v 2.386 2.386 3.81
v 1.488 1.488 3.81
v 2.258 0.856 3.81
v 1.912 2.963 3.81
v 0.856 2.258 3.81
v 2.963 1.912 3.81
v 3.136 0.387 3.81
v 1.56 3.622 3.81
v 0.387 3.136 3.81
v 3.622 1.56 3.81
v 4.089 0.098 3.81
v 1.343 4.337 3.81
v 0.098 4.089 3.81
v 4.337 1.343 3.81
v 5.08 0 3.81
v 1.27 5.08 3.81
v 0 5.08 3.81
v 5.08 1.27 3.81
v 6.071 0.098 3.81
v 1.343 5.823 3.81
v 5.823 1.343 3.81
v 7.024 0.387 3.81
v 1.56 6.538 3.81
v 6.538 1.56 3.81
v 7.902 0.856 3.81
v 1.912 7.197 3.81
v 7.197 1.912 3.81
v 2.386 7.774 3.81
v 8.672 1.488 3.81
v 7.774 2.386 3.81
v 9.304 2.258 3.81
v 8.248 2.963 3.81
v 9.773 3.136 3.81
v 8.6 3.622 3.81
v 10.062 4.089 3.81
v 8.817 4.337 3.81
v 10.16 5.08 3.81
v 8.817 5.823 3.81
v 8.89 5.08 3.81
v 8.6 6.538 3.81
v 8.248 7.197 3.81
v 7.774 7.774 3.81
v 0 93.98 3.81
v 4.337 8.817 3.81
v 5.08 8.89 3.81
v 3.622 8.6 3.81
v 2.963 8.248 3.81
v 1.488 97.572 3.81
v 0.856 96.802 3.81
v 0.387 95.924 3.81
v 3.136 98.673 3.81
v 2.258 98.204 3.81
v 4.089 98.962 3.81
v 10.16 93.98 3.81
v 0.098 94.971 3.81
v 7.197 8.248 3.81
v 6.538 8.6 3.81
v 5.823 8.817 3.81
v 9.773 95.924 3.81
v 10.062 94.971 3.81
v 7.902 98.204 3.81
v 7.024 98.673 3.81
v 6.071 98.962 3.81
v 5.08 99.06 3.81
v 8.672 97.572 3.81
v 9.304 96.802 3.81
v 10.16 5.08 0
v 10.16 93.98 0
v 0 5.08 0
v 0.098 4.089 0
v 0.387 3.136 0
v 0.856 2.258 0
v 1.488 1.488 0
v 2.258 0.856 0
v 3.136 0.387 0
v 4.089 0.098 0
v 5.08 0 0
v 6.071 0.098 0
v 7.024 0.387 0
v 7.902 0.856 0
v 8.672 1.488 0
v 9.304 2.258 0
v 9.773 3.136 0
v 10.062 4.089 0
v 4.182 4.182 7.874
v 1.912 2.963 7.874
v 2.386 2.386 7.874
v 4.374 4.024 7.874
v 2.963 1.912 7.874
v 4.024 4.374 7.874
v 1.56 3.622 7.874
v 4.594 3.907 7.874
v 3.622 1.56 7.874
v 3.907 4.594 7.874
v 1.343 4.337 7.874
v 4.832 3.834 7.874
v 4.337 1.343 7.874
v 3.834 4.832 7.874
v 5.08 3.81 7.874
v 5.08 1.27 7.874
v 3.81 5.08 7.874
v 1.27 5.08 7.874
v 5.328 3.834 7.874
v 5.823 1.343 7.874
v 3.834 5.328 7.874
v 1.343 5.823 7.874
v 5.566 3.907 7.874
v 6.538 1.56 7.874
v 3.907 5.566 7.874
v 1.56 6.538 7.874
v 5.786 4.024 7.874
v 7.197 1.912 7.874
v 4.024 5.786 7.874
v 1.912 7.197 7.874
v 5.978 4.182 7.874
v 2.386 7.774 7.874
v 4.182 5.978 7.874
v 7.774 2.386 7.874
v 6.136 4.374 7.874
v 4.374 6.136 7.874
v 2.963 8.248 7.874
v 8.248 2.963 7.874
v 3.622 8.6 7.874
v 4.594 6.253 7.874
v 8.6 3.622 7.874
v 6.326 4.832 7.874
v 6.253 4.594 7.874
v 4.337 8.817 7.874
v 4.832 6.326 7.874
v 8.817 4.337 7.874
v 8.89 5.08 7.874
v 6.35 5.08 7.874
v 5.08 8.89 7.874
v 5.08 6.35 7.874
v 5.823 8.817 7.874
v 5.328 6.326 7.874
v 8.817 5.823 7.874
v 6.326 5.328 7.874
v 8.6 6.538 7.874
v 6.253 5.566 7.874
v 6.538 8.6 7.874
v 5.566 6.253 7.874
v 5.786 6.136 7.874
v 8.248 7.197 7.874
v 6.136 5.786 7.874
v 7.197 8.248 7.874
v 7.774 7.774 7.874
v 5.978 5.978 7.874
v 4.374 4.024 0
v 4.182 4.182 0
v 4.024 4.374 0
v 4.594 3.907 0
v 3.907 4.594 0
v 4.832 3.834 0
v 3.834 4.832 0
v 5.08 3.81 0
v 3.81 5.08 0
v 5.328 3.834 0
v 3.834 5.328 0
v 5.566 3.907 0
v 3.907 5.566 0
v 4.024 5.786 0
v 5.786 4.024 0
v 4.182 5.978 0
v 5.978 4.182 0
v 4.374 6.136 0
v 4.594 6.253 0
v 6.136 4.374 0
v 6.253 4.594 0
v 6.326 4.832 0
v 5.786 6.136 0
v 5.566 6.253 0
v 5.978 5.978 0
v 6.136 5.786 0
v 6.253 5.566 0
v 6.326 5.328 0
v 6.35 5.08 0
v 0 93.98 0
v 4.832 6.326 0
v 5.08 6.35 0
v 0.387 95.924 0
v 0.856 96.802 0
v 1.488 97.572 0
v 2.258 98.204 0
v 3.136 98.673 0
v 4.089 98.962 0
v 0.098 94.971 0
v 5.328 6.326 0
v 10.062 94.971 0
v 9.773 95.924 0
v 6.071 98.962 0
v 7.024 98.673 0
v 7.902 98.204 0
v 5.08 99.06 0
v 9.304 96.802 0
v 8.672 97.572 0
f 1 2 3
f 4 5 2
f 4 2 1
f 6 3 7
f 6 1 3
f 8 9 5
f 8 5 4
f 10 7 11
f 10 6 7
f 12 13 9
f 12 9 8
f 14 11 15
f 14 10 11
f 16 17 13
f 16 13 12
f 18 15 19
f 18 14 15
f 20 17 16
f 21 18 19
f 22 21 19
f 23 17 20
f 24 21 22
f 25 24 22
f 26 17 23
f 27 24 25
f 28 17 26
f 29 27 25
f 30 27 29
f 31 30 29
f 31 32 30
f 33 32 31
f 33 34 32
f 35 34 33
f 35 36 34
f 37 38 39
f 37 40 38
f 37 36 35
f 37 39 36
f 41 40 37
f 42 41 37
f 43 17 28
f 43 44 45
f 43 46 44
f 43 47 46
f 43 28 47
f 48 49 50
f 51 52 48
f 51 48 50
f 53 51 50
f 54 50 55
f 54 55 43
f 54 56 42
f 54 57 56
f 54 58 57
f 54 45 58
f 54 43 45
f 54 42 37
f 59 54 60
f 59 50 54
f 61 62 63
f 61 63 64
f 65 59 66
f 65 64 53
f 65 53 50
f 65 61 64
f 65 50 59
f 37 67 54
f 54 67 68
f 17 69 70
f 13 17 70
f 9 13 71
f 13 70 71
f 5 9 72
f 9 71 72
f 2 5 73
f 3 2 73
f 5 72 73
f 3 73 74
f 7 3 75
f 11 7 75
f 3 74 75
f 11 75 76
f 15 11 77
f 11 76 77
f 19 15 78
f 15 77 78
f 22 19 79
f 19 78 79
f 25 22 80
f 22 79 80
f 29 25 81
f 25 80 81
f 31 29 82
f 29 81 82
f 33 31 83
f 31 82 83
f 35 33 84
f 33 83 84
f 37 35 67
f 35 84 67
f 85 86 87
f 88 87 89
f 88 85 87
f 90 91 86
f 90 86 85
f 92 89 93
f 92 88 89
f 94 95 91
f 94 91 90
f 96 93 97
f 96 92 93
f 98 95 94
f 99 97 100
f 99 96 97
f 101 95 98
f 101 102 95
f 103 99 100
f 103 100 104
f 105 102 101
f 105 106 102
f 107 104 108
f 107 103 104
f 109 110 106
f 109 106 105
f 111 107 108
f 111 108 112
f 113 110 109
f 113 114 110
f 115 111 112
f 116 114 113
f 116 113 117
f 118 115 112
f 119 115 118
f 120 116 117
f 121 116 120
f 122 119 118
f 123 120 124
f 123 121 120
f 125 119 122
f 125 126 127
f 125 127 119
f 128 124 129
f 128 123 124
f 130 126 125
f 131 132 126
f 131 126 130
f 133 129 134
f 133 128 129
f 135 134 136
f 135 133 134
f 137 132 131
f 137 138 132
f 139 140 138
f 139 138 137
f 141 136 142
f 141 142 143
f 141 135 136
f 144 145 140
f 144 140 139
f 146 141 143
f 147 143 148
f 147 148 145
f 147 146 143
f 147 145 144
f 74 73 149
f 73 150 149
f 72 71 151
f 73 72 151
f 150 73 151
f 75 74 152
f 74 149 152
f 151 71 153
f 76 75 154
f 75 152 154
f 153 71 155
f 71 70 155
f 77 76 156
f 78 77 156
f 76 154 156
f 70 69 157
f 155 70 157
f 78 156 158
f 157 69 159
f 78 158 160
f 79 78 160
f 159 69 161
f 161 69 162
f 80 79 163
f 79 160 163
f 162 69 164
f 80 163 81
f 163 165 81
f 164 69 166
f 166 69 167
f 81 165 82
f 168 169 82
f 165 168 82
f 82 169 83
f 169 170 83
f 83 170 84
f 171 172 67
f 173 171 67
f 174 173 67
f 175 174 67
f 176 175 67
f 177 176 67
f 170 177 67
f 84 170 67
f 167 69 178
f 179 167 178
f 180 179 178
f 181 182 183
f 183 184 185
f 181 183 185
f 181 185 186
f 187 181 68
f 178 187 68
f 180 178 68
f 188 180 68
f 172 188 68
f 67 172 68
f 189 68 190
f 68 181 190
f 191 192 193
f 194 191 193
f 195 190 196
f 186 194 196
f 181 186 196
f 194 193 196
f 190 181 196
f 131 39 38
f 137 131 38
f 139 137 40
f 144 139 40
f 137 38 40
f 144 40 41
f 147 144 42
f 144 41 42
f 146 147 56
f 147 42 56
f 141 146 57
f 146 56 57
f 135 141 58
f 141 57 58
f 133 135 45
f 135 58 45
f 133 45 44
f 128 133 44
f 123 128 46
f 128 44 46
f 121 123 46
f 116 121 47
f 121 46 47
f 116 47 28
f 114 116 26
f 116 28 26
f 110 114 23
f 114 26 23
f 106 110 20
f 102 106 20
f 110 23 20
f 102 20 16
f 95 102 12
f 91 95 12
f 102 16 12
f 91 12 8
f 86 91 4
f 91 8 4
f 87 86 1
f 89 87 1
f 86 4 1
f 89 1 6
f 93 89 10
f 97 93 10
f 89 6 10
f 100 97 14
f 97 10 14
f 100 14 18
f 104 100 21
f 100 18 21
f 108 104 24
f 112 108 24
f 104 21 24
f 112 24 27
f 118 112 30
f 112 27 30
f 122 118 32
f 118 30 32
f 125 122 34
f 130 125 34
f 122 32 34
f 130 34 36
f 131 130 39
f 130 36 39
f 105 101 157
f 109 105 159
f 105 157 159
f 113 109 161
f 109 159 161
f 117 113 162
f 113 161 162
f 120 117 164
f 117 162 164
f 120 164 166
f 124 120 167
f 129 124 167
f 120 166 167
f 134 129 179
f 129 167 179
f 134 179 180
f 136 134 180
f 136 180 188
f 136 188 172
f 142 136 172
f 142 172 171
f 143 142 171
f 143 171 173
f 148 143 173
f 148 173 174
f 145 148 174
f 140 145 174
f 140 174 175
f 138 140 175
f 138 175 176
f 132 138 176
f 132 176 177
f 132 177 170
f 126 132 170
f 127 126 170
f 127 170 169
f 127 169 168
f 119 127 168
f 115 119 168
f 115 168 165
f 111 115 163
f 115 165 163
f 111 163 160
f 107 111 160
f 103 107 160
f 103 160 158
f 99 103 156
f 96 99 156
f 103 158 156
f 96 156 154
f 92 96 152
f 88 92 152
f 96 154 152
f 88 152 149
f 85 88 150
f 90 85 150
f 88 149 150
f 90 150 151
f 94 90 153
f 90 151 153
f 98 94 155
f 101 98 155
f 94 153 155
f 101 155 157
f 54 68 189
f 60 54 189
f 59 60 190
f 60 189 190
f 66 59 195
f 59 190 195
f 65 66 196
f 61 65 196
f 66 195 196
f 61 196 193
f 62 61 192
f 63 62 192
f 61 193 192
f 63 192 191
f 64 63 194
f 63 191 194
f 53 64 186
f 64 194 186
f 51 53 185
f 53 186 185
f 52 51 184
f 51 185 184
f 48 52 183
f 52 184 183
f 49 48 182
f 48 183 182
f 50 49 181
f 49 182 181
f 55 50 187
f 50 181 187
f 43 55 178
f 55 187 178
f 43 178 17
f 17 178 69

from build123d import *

# Parameters (mm, degrees)
F1_DEPTH = 3.81
F2_R     = 3.81
F3_DEPTH = 4.064
F5_D     = 2.54
F5_DEPTH = 12.7


with BuildPart() as f1:
    # F0 (on Top) → F1 (new body)
    with BuildSketch(Plane.XY):
        with BuildLine():
            Line((0, 93.98), (0, 5.08))
            ThreePointArc((0, 5.08), (5.08, 0), (10.16, 5.08))
            Line((10.16, 5.08), (10.16, 93.98))
            ThreePointArc((10.16, 93.98), (5.08, 99.06), (0, 93.98))
        make_face()
    extrude(amount=F1_DEPTH)

    # F2 (on face) → F3 (join)
    with BuildSketch(Plane.XY.offset(3.81)):
        with Locations((5.08, 5.08)):
            Circle(F2_R)
    extrude(amount=F3_DEPTH)

    # F5
    with Locations(Plane.XY.offset(7.874)):
        with Locations((5.08, 5.08)):
            Hole(F5_D / 2, depth=F5_DEPTH)


solid = f1.part
